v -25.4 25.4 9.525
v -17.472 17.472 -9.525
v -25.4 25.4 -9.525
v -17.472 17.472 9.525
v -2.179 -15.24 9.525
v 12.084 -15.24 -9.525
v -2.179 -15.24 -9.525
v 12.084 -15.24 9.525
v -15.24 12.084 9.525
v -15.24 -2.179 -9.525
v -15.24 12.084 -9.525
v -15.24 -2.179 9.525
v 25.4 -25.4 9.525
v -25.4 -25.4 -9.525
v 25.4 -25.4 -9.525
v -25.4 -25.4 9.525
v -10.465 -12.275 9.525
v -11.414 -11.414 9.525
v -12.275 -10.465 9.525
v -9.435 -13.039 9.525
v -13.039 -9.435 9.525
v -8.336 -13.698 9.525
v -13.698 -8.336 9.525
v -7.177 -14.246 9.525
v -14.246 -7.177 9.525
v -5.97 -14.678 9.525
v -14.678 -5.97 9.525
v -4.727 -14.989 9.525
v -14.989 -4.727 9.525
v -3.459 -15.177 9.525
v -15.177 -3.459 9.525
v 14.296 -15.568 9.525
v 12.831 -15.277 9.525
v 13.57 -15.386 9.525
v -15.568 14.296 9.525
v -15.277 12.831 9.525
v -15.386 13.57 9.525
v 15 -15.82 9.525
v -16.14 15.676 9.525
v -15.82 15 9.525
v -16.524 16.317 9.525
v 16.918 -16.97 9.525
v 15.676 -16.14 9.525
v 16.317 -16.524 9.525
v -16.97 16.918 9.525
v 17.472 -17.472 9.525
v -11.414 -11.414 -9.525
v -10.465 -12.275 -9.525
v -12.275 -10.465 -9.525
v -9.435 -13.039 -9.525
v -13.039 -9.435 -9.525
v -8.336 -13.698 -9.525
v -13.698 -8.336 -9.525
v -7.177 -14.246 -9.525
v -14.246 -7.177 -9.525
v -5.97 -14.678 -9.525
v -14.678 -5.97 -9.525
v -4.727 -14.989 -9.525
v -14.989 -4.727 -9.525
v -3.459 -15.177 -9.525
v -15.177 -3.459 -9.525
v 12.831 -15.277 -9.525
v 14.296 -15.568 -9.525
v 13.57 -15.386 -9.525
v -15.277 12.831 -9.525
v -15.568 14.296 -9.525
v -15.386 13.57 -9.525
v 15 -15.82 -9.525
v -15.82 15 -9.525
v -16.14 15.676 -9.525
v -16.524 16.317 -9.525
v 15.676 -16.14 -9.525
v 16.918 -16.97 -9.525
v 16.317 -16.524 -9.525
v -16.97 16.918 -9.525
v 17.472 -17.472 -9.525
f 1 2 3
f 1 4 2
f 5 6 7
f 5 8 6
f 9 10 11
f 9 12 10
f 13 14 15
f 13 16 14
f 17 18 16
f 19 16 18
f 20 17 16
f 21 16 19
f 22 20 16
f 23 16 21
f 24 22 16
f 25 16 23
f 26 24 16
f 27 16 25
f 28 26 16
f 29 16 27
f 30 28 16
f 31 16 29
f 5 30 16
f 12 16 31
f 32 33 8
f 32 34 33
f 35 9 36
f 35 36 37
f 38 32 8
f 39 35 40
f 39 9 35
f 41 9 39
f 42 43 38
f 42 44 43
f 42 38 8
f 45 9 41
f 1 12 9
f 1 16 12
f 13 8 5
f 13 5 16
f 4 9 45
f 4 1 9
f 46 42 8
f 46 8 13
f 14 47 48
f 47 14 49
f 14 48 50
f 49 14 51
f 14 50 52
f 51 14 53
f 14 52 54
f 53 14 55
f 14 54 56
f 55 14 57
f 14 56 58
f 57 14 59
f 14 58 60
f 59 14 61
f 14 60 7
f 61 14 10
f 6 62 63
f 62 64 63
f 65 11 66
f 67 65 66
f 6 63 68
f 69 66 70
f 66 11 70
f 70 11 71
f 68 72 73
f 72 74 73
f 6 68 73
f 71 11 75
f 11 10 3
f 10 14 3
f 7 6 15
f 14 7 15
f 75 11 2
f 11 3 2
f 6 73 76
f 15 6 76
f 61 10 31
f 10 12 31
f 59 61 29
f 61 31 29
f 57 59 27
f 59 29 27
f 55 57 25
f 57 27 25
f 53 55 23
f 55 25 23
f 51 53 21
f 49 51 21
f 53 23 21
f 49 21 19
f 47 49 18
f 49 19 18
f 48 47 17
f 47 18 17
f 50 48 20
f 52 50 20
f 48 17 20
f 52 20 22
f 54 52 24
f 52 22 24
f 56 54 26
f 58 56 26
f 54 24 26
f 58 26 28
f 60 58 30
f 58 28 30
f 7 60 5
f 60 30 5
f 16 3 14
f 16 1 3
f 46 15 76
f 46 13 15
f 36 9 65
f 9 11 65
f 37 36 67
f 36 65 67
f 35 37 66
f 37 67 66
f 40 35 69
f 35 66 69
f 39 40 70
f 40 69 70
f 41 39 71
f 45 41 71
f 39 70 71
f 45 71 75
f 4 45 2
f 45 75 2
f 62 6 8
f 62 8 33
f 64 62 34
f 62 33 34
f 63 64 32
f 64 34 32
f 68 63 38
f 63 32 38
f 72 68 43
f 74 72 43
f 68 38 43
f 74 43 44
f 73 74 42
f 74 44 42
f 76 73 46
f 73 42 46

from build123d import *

# Parameters (mm, degrees)
F1_DEPTH = 9.525
F2_R     = 13.061378
F3_R     = 7.62


with BuildPart() as f1:
    # F0 (on Top) → F1 (new body, symmetric)
    with BuildSketch(Plane.XY):
        Polygon((-25.4, -25.4), (25.4, -25.4), (15.24, -15.24), (-15.24, -15.24), (-15.24, 15.24), (-25.4, 25.4), align=None)
    extrude(amount=F1_DEPTH, both=True)

    # F2
    f2_edges = [f1.edges().sort_by_distance(p)[0] for p in [
        (-15.24, -15.24, 0),
    ]]
    fillet(f2_edges, radius=F2_R)

    # F3
    f3_edges = [f1.edges().sort_by_distance(p)[0] for p in [
        (-15.24, 15.24, 0),
        (15.24, -15.24, 0),
    ]]
    fillet(f3_edges, radius=F3_R)


solid = f1.part
